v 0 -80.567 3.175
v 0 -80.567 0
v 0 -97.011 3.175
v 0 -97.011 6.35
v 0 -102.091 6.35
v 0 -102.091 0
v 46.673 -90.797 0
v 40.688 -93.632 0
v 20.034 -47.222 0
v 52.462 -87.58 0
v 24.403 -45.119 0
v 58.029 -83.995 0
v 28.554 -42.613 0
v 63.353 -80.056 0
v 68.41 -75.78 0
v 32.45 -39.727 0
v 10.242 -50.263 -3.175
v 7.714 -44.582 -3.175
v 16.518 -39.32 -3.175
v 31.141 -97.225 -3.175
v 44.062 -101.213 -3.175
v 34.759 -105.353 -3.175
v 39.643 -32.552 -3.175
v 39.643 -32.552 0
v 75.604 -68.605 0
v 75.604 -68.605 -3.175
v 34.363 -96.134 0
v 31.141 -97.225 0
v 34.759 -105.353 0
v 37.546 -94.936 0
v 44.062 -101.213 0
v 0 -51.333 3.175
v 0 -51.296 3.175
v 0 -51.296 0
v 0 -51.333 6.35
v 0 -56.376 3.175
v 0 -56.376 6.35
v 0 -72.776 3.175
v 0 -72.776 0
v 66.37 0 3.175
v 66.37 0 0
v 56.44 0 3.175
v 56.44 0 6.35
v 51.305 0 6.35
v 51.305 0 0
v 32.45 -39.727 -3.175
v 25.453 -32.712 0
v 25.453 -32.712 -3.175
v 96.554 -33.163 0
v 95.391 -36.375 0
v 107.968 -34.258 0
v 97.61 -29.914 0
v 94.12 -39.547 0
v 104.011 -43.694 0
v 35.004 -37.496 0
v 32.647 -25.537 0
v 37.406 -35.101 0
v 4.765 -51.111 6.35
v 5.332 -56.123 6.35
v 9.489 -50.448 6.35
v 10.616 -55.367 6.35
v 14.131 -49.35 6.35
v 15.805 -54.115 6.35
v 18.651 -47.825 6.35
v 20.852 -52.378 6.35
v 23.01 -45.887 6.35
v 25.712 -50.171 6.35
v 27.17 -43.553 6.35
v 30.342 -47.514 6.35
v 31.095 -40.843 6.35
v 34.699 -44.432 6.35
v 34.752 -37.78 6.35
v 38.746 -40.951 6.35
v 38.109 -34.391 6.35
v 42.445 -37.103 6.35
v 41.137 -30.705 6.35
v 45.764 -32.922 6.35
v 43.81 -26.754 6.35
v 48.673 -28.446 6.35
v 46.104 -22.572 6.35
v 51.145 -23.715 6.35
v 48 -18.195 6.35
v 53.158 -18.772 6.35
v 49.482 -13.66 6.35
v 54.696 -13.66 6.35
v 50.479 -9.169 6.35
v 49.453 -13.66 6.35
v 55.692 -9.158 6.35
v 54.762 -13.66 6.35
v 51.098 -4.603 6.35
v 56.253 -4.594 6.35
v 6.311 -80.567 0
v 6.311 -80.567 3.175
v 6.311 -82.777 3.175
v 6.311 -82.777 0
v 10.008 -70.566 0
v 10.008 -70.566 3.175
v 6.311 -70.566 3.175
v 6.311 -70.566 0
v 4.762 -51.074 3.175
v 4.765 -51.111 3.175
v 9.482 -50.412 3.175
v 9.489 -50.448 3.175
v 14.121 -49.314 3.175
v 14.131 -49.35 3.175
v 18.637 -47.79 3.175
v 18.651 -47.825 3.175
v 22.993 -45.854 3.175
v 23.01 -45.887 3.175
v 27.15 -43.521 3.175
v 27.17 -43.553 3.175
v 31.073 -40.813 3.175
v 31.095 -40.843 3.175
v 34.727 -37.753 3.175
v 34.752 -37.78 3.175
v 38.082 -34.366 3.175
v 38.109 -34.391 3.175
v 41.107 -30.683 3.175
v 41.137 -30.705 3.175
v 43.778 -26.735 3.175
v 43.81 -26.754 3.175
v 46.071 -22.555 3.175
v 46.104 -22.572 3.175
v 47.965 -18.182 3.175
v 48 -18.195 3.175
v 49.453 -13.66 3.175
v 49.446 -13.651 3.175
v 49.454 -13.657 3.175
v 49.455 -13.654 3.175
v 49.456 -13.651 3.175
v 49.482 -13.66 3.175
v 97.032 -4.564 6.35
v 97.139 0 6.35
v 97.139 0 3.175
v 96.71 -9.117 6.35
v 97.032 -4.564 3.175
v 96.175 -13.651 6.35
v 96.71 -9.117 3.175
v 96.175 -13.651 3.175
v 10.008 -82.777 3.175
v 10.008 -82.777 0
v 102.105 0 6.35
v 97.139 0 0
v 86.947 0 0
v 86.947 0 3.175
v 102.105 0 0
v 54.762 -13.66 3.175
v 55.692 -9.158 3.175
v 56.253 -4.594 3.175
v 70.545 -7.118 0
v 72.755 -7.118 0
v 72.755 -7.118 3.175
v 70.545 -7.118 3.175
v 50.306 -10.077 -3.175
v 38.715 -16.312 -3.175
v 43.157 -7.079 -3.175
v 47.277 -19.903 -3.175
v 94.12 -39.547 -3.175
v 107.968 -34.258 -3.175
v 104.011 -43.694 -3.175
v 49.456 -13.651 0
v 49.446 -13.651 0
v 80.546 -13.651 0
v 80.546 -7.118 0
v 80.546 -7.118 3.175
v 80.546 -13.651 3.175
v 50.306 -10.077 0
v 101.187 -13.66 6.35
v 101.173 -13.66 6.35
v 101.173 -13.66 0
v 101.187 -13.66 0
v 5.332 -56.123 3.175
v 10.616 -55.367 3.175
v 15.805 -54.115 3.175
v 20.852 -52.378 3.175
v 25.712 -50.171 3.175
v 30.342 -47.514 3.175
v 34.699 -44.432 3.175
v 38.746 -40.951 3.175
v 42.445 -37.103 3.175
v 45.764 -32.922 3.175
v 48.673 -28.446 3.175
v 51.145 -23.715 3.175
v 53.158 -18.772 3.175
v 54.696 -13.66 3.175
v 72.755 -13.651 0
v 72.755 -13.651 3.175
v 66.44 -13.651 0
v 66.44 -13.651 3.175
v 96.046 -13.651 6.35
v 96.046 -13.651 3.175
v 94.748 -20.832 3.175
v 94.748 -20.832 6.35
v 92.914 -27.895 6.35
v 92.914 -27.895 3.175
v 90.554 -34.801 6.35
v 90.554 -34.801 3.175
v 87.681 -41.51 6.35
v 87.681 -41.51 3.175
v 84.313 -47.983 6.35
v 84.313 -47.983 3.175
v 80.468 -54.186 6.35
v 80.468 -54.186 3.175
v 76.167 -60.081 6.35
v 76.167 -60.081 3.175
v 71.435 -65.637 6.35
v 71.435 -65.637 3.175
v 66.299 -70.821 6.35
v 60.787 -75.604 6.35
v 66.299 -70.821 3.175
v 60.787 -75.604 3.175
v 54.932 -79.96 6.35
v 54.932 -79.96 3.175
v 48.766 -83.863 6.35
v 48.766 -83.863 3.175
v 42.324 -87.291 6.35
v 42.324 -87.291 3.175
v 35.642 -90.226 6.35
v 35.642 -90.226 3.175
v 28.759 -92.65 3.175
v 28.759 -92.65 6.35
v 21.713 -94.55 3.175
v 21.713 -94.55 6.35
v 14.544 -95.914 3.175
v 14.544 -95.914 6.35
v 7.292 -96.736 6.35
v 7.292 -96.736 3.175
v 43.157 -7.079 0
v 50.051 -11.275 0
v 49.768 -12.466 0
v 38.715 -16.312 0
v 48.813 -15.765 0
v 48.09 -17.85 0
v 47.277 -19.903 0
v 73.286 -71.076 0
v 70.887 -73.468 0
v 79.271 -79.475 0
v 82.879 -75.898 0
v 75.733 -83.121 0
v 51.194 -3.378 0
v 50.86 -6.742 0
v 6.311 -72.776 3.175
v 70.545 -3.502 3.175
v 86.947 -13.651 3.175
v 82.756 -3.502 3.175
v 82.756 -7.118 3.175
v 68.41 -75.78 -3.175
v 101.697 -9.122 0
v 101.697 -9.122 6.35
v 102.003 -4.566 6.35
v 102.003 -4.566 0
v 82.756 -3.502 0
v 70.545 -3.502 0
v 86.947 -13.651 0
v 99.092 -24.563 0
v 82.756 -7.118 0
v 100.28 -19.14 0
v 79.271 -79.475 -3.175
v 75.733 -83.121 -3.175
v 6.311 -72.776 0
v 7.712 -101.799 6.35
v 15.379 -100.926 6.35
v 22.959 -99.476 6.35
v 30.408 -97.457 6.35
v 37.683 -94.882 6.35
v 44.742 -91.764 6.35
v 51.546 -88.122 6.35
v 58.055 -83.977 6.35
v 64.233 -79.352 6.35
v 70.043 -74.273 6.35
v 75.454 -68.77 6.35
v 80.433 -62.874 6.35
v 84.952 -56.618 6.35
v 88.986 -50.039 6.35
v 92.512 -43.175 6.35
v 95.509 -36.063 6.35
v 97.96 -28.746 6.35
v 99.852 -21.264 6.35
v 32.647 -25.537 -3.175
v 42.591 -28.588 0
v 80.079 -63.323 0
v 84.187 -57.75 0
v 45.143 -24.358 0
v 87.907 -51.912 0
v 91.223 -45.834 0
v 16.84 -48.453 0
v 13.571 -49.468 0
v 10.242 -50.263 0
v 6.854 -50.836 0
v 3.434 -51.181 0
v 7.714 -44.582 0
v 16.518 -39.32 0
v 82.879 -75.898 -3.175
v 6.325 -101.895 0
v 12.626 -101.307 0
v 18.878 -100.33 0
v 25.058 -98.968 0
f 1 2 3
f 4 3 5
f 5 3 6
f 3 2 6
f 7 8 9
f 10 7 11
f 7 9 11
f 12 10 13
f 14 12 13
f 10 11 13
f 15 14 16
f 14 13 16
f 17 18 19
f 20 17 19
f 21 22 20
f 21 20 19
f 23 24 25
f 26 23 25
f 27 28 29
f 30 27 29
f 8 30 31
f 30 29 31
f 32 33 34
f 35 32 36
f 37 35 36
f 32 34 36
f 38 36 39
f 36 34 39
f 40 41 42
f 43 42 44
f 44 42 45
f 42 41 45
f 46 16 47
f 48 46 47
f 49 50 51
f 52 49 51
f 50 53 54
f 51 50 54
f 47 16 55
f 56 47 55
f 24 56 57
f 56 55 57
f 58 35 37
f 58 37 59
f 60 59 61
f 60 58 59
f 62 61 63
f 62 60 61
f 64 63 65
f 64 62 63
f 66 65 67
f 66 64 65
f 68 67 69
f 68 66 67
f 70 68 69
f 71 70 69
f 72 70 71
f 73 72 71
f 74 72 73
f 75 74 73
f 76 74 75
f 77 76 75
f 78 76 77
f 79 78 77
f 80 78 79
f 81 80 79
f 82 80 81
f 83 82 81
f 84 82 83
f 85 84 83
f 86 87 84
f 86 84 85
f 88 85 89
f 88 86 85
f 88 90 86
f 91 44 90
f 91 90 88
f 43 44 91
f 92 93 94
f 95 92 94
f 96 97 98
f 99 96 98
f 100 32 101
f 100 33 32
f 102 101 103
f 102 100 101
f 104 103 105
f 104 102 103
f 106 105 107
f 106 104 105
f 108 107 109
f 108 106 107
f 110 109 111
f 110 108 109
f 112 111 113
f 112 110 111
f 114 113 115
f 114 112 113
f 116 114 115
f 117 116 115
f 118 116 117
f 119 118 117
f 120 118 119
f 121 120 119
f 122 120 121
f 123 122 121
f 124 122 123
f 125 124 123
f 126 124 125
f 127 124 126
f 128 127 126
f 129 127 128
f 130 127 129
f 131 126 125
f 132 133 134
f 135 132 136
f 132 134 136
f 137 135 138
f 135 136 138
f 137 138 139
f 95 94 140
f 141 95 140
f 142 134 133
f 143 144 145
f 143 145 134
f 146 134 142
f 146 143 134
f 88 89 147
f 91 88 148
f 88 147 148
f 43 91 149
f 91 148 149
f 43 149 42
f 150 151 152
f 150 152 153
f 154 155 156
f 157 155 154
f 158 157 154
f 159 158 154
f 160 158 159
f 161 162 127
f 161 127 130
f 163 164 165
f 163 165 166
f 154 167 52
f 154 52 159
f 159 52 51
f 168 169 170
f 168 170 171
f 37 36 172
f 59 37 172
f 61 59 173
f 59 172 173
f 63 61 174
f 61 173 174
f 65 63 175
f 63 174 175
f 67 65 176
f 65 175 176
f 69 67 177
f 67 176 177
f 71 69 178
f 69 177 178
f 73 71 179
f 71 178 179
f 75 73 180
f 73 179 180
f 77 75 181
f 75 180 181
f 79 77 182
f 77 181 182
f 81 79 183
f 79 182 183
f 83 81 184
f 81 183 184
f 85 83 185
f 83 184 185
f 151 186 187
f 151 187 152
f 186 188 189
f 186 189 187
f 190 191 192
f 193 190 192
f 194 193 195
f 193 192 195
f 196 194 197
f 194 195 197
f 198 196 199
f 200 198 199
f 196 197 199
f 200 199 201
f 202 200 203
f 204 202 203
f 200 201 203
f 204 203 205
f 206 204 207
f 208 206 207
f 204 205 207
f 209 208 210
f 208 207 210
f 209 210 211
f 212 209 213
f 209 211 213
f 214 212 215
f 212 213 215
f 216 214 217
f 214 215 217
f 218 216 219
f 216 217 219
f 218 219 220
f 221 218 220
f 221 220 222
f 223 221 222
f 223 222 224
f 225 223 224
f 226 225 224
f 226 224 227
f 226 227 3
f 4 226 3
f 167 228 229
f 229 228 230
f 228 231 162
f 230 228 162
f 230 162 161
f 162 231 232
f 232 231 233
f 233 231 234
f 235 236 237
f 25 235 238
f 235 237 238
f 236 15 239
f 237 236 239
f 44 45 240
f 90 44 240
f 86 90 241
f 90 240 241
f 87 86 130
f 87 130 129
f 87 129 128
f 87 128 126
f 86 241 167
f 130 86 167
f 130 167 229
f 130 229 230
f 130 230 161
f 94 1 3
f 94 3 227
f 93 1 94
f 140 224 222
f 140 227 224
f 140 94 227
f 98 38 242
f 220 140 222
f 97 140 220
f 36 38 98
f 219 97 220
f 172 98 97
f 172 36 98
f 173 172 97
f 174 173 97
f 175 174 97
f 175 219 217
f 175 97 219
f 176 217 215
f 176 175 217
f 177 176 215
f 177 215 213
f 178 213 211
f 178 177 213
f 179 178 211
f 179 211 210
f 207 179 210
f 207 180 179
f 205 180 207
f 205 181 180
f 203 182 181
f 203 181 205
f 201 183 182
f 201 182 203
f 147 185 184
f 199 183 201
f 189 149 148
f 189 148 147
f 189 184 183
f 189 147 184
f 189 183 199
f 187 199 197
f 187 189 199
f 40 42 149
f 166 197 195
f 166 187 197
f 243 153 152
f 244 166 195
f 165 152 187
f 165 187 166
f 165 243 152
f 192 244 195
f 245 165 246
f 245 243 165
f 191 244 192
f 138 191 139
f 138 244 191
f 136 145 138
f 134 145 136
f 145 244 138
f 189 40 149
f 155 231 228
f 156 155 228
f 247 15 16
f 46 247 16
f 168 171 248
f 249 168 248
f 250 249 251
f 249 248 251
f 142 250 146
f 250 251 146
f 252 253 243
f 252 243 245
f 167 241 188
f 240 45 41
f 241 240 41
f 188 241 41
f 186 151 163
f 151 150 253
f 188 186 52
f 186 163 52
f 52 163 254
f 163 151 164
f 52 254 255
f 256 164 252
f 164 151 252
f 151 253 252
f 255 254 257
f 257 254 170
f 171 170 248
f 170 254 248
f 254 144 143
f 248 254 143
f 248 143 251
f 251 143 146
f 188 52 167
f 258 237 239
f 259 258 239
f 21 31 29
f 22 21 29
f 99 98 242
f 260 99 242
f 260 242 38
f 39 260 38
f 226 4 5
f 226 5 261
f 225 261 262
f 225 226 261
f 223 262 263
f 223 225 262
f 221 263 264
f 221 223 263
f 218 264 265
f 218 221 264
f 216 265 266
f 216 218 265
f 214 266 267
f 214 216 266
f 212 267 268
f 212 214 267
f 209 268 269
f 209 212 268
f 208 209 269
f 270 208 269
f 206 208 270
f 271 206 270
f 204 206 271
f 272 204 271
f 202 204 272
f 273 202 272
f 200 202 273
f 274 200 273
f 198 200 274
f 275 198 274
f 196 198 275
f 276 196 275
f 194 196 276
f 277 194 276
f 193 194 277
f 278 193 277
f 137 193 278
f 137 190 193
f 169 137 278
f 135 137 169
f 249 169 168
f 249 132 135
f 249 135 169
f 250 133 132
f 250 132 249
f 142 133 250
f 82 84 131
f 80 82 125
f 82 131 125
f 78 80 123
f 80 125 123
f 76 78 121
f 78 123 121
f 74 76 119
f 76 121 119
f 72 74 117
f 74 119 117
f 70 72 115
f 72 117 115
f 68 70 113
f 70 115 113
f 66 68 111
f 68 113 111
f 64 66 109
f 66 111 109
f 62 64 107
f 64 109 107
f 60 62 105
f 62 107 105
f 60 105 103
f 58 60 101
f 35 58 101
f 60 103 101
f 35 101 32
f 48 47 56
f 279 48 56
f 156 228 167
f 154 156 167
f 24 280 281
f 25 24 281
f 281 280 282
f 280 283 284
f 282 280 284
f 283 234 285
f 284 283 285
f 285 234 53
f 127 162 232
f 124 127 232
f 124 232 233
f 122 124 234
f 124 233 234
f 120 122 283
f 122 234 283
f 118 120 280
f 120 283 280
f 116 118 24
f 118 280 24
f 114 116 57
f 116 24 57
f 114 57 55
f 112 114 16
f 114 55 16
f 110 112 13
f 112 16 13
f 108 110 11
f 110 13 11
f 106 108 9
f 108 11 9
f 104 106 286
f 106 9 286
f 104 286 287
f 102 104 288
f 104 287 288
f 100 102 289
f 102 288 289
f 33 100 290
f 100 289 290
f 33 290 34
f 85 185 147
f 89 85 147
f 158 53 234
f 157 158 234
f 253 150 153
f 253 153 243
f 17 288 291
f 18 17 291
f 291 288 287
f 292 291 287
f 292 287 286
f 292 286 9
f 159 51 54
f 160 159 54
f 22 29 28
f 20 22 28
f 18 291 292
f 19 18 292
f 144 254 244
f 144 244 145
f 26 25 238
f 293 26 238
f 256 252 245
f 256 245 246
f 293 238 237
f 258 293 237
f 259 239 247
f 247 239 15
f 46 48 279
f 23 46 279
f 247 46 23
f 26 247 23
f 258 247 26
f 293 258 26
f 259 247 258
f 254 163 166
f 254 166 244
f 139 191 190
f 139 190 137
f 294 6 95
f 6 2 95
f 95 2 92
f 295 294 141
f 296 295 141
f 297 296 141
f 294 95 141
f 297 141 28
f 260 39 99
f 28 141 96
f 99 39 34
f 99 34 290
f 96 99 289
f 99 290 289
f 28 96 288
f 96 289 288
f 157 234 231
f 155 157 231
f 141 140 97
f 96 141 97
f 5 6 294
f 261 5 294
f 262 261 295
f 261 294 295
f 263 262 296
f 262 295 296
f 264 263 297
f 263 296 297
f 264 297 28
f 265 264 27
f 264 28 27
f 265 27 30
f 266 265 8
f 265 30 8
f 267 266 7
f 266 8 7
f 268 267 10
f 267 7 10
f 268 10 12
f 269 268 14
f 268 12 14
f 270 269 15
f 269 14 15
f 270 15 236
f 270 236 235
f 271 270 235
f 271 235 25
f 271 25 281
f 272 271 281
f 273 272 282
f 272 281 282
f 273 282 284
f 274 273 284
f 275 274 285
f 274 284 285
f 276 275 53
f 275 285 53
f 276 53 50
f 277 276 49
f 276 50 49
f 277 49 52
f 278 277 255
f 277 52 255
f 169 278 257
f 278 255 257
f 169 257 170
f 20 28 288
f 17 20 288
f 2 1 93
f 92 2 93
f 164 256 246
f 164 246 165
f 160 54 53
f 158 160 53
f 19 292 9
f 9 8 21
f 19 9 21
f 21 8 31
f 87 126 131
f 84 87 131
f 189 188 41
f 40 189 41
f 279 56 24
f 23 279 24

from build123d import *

# Parameters (mm, degrees)
F1_DEPTH  = 3.175
F2_W      = 14.0813224944
F2_H      = 13.6506203337
F3_DEPTH  = 3.175
F5_DEPTH  = 3.175
F2_W_2    = 4.1719265282
F6_DEPTH  = 25.4
F8_DEPTH  = 6.35
F9_DEPTH  = 3.175
F11_DEPTH = 25.4
F13_DEPTH = 3.175


with BuildPart() as f1:
    # F0 (on Top) → F1 (new body)
    with BuildSketch(Plane.XY):
        with BuildLine():
            Line((0, -51.2956328023), (0, -102.09075941))
            ThreePointArc((0, -102.09075941), (72.1890682753, -72.1890682753), (102.09075941, 0))
            Line((102.09075941, 0), (51.2956328023, 0))
            ThreePointArc((51.2956328023, 0), (36.2714897998, -36.2714897998), (0, -51.2956328023))
        make_face()
    extrude(amount=F1_DEPTH)

    # F2 (on Top) → F3 (join)
    with BuildSketch(Plane.XY):
        Polygon((70.5449951161, -7.1183972853), (72.7547951161, -7.1183972853), (72.7547951161, -13.6506203337), (80.5461628969, -13.6506203337), (80.5461628969, -7.1183972853), (82.7559628969, -7.1183972853), (82.7559628969, -3.5022496107), (70.5449951161, -3.5022496107), align=None)
        Polygon((51.7481602728, -13.6506203337), (66.4398123863, -13.6506203337), (66.3695515009, 0), (51.7481602728, 0), align=None)
        with Locations((93.9881238623, -6.8253101669)):
            Rectangle(F2_W, F2_H)
    extrude(amount=F3_DEPTH)

    # F4 (on face) → F5 (join)
    with BuildSketch(Plane.XY.offset(3.175)):
        with BuildLine():
            ThreePointArc((0, -56.3756328023), (39.8635922482, -39.8635922482), (56.3756328023, 0))
            Line((56.3756328023, 0), (51.3330261441, 0))
            ThreePointArc((51.3330261441, 0), (36.2979308853, -36.2979308853), (0, -51.3330261441))
            Line((0, -51.3330261441), (0, -56.3756328023))
        make_face()
        with BuildLine():
            Line((102.09075941, 0), (97.01075941, 0))
            ThreePointArc((97.01075941, 0), (68.5969658269, -68.5969658269), (0, -97.01075941))
            Line((0, -97.01075941), (0, -102.09075941))
            ThreePointArc((0, -102.09075941), (72.1890682753, -72.1890682753), (102.09075941, 0))
        make_face()
    extrude(amount=F5_DEPTH)

    # F2 (on Top) → F6 (cut)
    with BuildSketch(Plane.XY):
        Polygon((51.7481602728, -13.6506203337), (66.4398123863, -13.6506203337), (66.3695515009, 0), (51.7481602728, 0), align=None)
        Polygon((72.7547951161, -13.6506203337), (72.7547951161, -7.1183972853), (70.5449951161, -7.1183972853), (70.5449951161, -3.5022496107), (82.7559628969, -3.5022496107), (82.7559628969, -7.1183972853), (80.5461628969, -7.1183972853), (80.5461628969, -13.6506203337), (86.9474626151, -13.6506203337), (86.9474626151, 0), (76.6565515009, 0), (66.3695515009, 0), (66.4398123863, -13.6506203337), align=None)
        with Locations((93.9881238623, -6.8253101669)):
            Rectangle(F2_W, F2_H)
        with Locations((49.6621970087, -6.8253101669)):
            Rectangle(F2_W_2, F2_H)
    extrude(amount=F6_DEPTH, mode=Mode.SUBTRACT)

    # F7 (on Top) → F8 (join)
    with BuildSketch(Plane.XY):
        with BuildLine():
            ThreePointArc((54.7619331998, -13.660392724), (56.0189261095, -6.8815386855), (56.4400182242, 0))
            Line((56.4400182242, 0), (51.3051767249, 0))
            ThreePointArc((51.3051767249, 0), (50.8400637591, -6.8926827684), (49.4531579316, -13.660392724))
            Line((49.4531579316, -13.660392724), (54.7619331998, -13.660392724))
        make_face()
        with BuildLine():
            Line((102.1051767249, 0), (97.1390098326, 0))
            ThreePointArc((97.1390098326, 0), (96.8973822865, -6.8472284381), (96.1737017167, -13.660392724))
            Line((96.1737017167, -13.660392724), (101.1872560388, -13.660392724))
            ThreePointArc((101.1872560388, -13.660392724), (101.8754380952, -6.8455990928), (102.1051767249, 0))
        make_face()
    extrude(amount=F8_DEPTH)

    # F2 (on Top) → F9 (join)
    with BuildSketch(Plane.XY):
        with Locations((93.9881238623, -6.8253101669)):
            Rectangle(F2_W, F2_H)
        Polygon((51.7481602728, -13.6506203337), (66.4398123863, -13.6506203337), (66.3695515009, 0), (51.7481602728, 0), align=None)
    extrude(amount=F9_DEPTH)

    # F10 (on face) → F11 (cut)
    with BuildSketch(Plane.XY.offset(3.175)):
        Polygon((6.3110076786, -72.776100911), (0, -72.776100911), (0, -80.5674686917), (6.3110076786, -80.5674686917), (6.3110076786, -82.7772686917), (10.0084030033, -82.7772686917), (10.0084030033, -70.566300911), (6.3110076786, -70.566300911), align=None)
    extrude(amount=-F11_DEPTH, mode=Mode.SUBTRACT)

    # F12 (on face) → F13 (join)
    with BuildSketch(Plane(origin=(0, 0, 0), x_dir=(1, 0, 0), z_dir=(0, 0, -1))):
        with BuildLine():
            ThreePointArc((39.6434592285, 32.5520826521), (37.980845771, 34.4774897449), (36.2248193412, 36.3181002847))
            Line((36.2248193412, 36.3181002847), (29.0498583475, 29.1246633635))
            Line((29.0498583475, 29.1246633635), (32.646576808, 25.5371828667))
            Line((32.646576808, 25.5371828667), (39.6434592285, 32.5520826521))
        make_face()
        with BuildLine():
            Line((29.0498583475, 29.1246633635), (36.2248193412, 36.3181002847))
            ThreePointArc((36.2248193412, 36.3181002847), (34.3796988436, 38.0693873344), (32.4500223073, 39.7270436459))
            Line((32.4500223073, 39.7270436459), (25.4531398869, 32.7121438604))
            Line((25.4531398869, 32.7121438604), (29.0498583475, 29.1246633635))
        make_face()
        with BuildLine():
            Line((36.2248193412, 36.3181002847), (72.0961827352, 72.2818344532))
            ThreePointArc((72.0961827352, 72.2818344532), (70.2749350461, 74.0537417095), (68.4101530773, 75.7797737714))
            Line((68.4101530773, 75.7797737714), (32.4500223073, 39.7270436459))
            ThreePointArc((32.4500223073, 39.7270436459), (34.3796988436, 38.0693873344), (36.2248193412, 36.3181002847))
        make_face()
        with BuildLine():
            ThreePointArc((75.6035899985, 68.6048127777), (73.8727679087, 70.4651496728), (72.0961827352, 72.2818344532))
            Line((72.0961827352, 72.2818344532), (36.2248193412, 36.3181002847))
            ThreePointArc((36.2248193412, 36.3181002847), (37.980845771, 34.4774897449), (39.6434592285, 32.5520826521))
            Line((39.6434592285, 32.5520826521), (75.6035899985, 68.6048127777))
        make_face()
        with BuildLine():
            Line((79.271143729, 79.4752713743), (72.0961827352, 72.2818344532))
            ThreePointArc((72.0961827352, 72.2818344532), (73.8727679087, 70.4651496728), (75.6035899985, 68.6048127777))
            Line((75.6035899985, 68.6048127777), (82.8785053866, 75.8984614814))
            Line((82.8785053866, 75.8984614814), (79.271143729, 79.4752713743))
        make_face()
        with BuildLine():
            ThreePointArc((68.4101530773, 75.7797737714), (70.2749350461, 74.0537417095), (72.0961827352, 72.2818344532))
            Line((72.0961827352, 72.2818344532), (79.271143729, 79.4752713743))
            Line((79.271143729, 79.4752713743), (75.7328631666, 83.1213402502))
            Line((75.7328631666, 83.1213402502), (68.4101530773, 75.7797737714))
        make_face()
        with BuildLine():
            Line((20.0341812257, 47.2215366883), (40.6881574418, 93.6322433828))
            ThreePointArc((40.6881574418, 93.6322433828), (35.9596571955, 95.5480309127), (31.1413521737, 97.2251991086))
            Line((31.1413521737, 97.2251991086), (10.2418471319, 50.2627746142))
            ThreePointArc((10.2418471319, 50.2627746142), (15.2141958482, 48.9874493037), (20.0341812257, 47.2215366883))
        make_face()
        with BuildLine():
            ThreePointArc((31.1413521737, 97.2251991086), (35.9596571955, 95.5480309127), (40.6881574418, 93.6322433828))
            Line((40.6881574418, 93.6322433828), (44.0618023276, 101.2130230665))
            Line((44.0618023276, 101.2130230665), (34.7585338749, 105.353220427))
            Line((34.7585338749, 105.353220427), (31.1413521737, 97.2251991086))
        make_face()
        with BuildLine():
            Line((16.5176168084, 39.3196083605), (20.0341812257, 47.2215366883))
            ThreePointArc((20.0341812257, 47.2215366883), (15.2141958482, 48.9874493037), (10.2418471319, 50.2627746142))
            Line((10.2418471319, 50.2627746142), (7.7137911807, 44.5820833017))
            Line((7.7137911807, 44.5820833017), (16.5176168084, 39.3196083605))
        make_face()
        with BuildLine():
            ThreePointArc((49.4459554372, 13.6506203337), (48.462460254, 16.8116593685), (47.2771132537, 19.902675875))
            Line((47.2771132537, 19.902675875), (38.7149937451, 16.3121093065))
            Line((38.7149937451, 16.3121093065), (43.1567628434, 7.0787111473))
            Line((43.1567628434, 7.0787111473), (50.3058721439, 10.0767249947))
            ThreePointArc((50.3058721439, 10.0767249947), (49.9128620494, 11.8712830314), (49.4558563093, 13.6506203337))
            Line((49.4558563093, 13.6506203337), (49.4459554372, 13.6506203337))
        make_face()
        with BuildLine():
            ThreePointArc((97.6098508897, 29.9138791566), (95.9858944102, 34.7740022313), (94.1201154327, 39.5465172658))
            Line((94.1201154327, 39.5465172658), (47.2771132537, 19.902675875))
            ThreePointArc((47.2771132537, 19.902675875), (48.462460254, 16.8116593685), (49.4459554372, 13.6506203337))
            Line((49.4459554372, 13.6506203337), (49.4558563093, 13.6506203337))
            ThreePointArc((49.4558563093, 13.6506203337), (49.9128620494, 11.8712830314), (50.3058721439, 10.0767249947))
            Line((50.3058721439, 10.0767249947), (97.6098508897, 29.9138791566))
        make_face()
        with BuildLine():
            Line((104.0109246969, 43.6942763627), (94.1201154327, 39.5465172658))
            ThreePointArc((94.1201154327, 39.5465172658), (95.9858944102, 34.7740022313), (97.6098508897, 29.9138791566))
            Line((97.6098508897, 29.9138791566), (107.9681979582, 34.2577025116))
            Line((107.9681979582, 34.2577025116), (104.0109246969, 43.6942763627))
        make_face()
    extrude(amount=F13_DEPTH)


solid = f1.part
